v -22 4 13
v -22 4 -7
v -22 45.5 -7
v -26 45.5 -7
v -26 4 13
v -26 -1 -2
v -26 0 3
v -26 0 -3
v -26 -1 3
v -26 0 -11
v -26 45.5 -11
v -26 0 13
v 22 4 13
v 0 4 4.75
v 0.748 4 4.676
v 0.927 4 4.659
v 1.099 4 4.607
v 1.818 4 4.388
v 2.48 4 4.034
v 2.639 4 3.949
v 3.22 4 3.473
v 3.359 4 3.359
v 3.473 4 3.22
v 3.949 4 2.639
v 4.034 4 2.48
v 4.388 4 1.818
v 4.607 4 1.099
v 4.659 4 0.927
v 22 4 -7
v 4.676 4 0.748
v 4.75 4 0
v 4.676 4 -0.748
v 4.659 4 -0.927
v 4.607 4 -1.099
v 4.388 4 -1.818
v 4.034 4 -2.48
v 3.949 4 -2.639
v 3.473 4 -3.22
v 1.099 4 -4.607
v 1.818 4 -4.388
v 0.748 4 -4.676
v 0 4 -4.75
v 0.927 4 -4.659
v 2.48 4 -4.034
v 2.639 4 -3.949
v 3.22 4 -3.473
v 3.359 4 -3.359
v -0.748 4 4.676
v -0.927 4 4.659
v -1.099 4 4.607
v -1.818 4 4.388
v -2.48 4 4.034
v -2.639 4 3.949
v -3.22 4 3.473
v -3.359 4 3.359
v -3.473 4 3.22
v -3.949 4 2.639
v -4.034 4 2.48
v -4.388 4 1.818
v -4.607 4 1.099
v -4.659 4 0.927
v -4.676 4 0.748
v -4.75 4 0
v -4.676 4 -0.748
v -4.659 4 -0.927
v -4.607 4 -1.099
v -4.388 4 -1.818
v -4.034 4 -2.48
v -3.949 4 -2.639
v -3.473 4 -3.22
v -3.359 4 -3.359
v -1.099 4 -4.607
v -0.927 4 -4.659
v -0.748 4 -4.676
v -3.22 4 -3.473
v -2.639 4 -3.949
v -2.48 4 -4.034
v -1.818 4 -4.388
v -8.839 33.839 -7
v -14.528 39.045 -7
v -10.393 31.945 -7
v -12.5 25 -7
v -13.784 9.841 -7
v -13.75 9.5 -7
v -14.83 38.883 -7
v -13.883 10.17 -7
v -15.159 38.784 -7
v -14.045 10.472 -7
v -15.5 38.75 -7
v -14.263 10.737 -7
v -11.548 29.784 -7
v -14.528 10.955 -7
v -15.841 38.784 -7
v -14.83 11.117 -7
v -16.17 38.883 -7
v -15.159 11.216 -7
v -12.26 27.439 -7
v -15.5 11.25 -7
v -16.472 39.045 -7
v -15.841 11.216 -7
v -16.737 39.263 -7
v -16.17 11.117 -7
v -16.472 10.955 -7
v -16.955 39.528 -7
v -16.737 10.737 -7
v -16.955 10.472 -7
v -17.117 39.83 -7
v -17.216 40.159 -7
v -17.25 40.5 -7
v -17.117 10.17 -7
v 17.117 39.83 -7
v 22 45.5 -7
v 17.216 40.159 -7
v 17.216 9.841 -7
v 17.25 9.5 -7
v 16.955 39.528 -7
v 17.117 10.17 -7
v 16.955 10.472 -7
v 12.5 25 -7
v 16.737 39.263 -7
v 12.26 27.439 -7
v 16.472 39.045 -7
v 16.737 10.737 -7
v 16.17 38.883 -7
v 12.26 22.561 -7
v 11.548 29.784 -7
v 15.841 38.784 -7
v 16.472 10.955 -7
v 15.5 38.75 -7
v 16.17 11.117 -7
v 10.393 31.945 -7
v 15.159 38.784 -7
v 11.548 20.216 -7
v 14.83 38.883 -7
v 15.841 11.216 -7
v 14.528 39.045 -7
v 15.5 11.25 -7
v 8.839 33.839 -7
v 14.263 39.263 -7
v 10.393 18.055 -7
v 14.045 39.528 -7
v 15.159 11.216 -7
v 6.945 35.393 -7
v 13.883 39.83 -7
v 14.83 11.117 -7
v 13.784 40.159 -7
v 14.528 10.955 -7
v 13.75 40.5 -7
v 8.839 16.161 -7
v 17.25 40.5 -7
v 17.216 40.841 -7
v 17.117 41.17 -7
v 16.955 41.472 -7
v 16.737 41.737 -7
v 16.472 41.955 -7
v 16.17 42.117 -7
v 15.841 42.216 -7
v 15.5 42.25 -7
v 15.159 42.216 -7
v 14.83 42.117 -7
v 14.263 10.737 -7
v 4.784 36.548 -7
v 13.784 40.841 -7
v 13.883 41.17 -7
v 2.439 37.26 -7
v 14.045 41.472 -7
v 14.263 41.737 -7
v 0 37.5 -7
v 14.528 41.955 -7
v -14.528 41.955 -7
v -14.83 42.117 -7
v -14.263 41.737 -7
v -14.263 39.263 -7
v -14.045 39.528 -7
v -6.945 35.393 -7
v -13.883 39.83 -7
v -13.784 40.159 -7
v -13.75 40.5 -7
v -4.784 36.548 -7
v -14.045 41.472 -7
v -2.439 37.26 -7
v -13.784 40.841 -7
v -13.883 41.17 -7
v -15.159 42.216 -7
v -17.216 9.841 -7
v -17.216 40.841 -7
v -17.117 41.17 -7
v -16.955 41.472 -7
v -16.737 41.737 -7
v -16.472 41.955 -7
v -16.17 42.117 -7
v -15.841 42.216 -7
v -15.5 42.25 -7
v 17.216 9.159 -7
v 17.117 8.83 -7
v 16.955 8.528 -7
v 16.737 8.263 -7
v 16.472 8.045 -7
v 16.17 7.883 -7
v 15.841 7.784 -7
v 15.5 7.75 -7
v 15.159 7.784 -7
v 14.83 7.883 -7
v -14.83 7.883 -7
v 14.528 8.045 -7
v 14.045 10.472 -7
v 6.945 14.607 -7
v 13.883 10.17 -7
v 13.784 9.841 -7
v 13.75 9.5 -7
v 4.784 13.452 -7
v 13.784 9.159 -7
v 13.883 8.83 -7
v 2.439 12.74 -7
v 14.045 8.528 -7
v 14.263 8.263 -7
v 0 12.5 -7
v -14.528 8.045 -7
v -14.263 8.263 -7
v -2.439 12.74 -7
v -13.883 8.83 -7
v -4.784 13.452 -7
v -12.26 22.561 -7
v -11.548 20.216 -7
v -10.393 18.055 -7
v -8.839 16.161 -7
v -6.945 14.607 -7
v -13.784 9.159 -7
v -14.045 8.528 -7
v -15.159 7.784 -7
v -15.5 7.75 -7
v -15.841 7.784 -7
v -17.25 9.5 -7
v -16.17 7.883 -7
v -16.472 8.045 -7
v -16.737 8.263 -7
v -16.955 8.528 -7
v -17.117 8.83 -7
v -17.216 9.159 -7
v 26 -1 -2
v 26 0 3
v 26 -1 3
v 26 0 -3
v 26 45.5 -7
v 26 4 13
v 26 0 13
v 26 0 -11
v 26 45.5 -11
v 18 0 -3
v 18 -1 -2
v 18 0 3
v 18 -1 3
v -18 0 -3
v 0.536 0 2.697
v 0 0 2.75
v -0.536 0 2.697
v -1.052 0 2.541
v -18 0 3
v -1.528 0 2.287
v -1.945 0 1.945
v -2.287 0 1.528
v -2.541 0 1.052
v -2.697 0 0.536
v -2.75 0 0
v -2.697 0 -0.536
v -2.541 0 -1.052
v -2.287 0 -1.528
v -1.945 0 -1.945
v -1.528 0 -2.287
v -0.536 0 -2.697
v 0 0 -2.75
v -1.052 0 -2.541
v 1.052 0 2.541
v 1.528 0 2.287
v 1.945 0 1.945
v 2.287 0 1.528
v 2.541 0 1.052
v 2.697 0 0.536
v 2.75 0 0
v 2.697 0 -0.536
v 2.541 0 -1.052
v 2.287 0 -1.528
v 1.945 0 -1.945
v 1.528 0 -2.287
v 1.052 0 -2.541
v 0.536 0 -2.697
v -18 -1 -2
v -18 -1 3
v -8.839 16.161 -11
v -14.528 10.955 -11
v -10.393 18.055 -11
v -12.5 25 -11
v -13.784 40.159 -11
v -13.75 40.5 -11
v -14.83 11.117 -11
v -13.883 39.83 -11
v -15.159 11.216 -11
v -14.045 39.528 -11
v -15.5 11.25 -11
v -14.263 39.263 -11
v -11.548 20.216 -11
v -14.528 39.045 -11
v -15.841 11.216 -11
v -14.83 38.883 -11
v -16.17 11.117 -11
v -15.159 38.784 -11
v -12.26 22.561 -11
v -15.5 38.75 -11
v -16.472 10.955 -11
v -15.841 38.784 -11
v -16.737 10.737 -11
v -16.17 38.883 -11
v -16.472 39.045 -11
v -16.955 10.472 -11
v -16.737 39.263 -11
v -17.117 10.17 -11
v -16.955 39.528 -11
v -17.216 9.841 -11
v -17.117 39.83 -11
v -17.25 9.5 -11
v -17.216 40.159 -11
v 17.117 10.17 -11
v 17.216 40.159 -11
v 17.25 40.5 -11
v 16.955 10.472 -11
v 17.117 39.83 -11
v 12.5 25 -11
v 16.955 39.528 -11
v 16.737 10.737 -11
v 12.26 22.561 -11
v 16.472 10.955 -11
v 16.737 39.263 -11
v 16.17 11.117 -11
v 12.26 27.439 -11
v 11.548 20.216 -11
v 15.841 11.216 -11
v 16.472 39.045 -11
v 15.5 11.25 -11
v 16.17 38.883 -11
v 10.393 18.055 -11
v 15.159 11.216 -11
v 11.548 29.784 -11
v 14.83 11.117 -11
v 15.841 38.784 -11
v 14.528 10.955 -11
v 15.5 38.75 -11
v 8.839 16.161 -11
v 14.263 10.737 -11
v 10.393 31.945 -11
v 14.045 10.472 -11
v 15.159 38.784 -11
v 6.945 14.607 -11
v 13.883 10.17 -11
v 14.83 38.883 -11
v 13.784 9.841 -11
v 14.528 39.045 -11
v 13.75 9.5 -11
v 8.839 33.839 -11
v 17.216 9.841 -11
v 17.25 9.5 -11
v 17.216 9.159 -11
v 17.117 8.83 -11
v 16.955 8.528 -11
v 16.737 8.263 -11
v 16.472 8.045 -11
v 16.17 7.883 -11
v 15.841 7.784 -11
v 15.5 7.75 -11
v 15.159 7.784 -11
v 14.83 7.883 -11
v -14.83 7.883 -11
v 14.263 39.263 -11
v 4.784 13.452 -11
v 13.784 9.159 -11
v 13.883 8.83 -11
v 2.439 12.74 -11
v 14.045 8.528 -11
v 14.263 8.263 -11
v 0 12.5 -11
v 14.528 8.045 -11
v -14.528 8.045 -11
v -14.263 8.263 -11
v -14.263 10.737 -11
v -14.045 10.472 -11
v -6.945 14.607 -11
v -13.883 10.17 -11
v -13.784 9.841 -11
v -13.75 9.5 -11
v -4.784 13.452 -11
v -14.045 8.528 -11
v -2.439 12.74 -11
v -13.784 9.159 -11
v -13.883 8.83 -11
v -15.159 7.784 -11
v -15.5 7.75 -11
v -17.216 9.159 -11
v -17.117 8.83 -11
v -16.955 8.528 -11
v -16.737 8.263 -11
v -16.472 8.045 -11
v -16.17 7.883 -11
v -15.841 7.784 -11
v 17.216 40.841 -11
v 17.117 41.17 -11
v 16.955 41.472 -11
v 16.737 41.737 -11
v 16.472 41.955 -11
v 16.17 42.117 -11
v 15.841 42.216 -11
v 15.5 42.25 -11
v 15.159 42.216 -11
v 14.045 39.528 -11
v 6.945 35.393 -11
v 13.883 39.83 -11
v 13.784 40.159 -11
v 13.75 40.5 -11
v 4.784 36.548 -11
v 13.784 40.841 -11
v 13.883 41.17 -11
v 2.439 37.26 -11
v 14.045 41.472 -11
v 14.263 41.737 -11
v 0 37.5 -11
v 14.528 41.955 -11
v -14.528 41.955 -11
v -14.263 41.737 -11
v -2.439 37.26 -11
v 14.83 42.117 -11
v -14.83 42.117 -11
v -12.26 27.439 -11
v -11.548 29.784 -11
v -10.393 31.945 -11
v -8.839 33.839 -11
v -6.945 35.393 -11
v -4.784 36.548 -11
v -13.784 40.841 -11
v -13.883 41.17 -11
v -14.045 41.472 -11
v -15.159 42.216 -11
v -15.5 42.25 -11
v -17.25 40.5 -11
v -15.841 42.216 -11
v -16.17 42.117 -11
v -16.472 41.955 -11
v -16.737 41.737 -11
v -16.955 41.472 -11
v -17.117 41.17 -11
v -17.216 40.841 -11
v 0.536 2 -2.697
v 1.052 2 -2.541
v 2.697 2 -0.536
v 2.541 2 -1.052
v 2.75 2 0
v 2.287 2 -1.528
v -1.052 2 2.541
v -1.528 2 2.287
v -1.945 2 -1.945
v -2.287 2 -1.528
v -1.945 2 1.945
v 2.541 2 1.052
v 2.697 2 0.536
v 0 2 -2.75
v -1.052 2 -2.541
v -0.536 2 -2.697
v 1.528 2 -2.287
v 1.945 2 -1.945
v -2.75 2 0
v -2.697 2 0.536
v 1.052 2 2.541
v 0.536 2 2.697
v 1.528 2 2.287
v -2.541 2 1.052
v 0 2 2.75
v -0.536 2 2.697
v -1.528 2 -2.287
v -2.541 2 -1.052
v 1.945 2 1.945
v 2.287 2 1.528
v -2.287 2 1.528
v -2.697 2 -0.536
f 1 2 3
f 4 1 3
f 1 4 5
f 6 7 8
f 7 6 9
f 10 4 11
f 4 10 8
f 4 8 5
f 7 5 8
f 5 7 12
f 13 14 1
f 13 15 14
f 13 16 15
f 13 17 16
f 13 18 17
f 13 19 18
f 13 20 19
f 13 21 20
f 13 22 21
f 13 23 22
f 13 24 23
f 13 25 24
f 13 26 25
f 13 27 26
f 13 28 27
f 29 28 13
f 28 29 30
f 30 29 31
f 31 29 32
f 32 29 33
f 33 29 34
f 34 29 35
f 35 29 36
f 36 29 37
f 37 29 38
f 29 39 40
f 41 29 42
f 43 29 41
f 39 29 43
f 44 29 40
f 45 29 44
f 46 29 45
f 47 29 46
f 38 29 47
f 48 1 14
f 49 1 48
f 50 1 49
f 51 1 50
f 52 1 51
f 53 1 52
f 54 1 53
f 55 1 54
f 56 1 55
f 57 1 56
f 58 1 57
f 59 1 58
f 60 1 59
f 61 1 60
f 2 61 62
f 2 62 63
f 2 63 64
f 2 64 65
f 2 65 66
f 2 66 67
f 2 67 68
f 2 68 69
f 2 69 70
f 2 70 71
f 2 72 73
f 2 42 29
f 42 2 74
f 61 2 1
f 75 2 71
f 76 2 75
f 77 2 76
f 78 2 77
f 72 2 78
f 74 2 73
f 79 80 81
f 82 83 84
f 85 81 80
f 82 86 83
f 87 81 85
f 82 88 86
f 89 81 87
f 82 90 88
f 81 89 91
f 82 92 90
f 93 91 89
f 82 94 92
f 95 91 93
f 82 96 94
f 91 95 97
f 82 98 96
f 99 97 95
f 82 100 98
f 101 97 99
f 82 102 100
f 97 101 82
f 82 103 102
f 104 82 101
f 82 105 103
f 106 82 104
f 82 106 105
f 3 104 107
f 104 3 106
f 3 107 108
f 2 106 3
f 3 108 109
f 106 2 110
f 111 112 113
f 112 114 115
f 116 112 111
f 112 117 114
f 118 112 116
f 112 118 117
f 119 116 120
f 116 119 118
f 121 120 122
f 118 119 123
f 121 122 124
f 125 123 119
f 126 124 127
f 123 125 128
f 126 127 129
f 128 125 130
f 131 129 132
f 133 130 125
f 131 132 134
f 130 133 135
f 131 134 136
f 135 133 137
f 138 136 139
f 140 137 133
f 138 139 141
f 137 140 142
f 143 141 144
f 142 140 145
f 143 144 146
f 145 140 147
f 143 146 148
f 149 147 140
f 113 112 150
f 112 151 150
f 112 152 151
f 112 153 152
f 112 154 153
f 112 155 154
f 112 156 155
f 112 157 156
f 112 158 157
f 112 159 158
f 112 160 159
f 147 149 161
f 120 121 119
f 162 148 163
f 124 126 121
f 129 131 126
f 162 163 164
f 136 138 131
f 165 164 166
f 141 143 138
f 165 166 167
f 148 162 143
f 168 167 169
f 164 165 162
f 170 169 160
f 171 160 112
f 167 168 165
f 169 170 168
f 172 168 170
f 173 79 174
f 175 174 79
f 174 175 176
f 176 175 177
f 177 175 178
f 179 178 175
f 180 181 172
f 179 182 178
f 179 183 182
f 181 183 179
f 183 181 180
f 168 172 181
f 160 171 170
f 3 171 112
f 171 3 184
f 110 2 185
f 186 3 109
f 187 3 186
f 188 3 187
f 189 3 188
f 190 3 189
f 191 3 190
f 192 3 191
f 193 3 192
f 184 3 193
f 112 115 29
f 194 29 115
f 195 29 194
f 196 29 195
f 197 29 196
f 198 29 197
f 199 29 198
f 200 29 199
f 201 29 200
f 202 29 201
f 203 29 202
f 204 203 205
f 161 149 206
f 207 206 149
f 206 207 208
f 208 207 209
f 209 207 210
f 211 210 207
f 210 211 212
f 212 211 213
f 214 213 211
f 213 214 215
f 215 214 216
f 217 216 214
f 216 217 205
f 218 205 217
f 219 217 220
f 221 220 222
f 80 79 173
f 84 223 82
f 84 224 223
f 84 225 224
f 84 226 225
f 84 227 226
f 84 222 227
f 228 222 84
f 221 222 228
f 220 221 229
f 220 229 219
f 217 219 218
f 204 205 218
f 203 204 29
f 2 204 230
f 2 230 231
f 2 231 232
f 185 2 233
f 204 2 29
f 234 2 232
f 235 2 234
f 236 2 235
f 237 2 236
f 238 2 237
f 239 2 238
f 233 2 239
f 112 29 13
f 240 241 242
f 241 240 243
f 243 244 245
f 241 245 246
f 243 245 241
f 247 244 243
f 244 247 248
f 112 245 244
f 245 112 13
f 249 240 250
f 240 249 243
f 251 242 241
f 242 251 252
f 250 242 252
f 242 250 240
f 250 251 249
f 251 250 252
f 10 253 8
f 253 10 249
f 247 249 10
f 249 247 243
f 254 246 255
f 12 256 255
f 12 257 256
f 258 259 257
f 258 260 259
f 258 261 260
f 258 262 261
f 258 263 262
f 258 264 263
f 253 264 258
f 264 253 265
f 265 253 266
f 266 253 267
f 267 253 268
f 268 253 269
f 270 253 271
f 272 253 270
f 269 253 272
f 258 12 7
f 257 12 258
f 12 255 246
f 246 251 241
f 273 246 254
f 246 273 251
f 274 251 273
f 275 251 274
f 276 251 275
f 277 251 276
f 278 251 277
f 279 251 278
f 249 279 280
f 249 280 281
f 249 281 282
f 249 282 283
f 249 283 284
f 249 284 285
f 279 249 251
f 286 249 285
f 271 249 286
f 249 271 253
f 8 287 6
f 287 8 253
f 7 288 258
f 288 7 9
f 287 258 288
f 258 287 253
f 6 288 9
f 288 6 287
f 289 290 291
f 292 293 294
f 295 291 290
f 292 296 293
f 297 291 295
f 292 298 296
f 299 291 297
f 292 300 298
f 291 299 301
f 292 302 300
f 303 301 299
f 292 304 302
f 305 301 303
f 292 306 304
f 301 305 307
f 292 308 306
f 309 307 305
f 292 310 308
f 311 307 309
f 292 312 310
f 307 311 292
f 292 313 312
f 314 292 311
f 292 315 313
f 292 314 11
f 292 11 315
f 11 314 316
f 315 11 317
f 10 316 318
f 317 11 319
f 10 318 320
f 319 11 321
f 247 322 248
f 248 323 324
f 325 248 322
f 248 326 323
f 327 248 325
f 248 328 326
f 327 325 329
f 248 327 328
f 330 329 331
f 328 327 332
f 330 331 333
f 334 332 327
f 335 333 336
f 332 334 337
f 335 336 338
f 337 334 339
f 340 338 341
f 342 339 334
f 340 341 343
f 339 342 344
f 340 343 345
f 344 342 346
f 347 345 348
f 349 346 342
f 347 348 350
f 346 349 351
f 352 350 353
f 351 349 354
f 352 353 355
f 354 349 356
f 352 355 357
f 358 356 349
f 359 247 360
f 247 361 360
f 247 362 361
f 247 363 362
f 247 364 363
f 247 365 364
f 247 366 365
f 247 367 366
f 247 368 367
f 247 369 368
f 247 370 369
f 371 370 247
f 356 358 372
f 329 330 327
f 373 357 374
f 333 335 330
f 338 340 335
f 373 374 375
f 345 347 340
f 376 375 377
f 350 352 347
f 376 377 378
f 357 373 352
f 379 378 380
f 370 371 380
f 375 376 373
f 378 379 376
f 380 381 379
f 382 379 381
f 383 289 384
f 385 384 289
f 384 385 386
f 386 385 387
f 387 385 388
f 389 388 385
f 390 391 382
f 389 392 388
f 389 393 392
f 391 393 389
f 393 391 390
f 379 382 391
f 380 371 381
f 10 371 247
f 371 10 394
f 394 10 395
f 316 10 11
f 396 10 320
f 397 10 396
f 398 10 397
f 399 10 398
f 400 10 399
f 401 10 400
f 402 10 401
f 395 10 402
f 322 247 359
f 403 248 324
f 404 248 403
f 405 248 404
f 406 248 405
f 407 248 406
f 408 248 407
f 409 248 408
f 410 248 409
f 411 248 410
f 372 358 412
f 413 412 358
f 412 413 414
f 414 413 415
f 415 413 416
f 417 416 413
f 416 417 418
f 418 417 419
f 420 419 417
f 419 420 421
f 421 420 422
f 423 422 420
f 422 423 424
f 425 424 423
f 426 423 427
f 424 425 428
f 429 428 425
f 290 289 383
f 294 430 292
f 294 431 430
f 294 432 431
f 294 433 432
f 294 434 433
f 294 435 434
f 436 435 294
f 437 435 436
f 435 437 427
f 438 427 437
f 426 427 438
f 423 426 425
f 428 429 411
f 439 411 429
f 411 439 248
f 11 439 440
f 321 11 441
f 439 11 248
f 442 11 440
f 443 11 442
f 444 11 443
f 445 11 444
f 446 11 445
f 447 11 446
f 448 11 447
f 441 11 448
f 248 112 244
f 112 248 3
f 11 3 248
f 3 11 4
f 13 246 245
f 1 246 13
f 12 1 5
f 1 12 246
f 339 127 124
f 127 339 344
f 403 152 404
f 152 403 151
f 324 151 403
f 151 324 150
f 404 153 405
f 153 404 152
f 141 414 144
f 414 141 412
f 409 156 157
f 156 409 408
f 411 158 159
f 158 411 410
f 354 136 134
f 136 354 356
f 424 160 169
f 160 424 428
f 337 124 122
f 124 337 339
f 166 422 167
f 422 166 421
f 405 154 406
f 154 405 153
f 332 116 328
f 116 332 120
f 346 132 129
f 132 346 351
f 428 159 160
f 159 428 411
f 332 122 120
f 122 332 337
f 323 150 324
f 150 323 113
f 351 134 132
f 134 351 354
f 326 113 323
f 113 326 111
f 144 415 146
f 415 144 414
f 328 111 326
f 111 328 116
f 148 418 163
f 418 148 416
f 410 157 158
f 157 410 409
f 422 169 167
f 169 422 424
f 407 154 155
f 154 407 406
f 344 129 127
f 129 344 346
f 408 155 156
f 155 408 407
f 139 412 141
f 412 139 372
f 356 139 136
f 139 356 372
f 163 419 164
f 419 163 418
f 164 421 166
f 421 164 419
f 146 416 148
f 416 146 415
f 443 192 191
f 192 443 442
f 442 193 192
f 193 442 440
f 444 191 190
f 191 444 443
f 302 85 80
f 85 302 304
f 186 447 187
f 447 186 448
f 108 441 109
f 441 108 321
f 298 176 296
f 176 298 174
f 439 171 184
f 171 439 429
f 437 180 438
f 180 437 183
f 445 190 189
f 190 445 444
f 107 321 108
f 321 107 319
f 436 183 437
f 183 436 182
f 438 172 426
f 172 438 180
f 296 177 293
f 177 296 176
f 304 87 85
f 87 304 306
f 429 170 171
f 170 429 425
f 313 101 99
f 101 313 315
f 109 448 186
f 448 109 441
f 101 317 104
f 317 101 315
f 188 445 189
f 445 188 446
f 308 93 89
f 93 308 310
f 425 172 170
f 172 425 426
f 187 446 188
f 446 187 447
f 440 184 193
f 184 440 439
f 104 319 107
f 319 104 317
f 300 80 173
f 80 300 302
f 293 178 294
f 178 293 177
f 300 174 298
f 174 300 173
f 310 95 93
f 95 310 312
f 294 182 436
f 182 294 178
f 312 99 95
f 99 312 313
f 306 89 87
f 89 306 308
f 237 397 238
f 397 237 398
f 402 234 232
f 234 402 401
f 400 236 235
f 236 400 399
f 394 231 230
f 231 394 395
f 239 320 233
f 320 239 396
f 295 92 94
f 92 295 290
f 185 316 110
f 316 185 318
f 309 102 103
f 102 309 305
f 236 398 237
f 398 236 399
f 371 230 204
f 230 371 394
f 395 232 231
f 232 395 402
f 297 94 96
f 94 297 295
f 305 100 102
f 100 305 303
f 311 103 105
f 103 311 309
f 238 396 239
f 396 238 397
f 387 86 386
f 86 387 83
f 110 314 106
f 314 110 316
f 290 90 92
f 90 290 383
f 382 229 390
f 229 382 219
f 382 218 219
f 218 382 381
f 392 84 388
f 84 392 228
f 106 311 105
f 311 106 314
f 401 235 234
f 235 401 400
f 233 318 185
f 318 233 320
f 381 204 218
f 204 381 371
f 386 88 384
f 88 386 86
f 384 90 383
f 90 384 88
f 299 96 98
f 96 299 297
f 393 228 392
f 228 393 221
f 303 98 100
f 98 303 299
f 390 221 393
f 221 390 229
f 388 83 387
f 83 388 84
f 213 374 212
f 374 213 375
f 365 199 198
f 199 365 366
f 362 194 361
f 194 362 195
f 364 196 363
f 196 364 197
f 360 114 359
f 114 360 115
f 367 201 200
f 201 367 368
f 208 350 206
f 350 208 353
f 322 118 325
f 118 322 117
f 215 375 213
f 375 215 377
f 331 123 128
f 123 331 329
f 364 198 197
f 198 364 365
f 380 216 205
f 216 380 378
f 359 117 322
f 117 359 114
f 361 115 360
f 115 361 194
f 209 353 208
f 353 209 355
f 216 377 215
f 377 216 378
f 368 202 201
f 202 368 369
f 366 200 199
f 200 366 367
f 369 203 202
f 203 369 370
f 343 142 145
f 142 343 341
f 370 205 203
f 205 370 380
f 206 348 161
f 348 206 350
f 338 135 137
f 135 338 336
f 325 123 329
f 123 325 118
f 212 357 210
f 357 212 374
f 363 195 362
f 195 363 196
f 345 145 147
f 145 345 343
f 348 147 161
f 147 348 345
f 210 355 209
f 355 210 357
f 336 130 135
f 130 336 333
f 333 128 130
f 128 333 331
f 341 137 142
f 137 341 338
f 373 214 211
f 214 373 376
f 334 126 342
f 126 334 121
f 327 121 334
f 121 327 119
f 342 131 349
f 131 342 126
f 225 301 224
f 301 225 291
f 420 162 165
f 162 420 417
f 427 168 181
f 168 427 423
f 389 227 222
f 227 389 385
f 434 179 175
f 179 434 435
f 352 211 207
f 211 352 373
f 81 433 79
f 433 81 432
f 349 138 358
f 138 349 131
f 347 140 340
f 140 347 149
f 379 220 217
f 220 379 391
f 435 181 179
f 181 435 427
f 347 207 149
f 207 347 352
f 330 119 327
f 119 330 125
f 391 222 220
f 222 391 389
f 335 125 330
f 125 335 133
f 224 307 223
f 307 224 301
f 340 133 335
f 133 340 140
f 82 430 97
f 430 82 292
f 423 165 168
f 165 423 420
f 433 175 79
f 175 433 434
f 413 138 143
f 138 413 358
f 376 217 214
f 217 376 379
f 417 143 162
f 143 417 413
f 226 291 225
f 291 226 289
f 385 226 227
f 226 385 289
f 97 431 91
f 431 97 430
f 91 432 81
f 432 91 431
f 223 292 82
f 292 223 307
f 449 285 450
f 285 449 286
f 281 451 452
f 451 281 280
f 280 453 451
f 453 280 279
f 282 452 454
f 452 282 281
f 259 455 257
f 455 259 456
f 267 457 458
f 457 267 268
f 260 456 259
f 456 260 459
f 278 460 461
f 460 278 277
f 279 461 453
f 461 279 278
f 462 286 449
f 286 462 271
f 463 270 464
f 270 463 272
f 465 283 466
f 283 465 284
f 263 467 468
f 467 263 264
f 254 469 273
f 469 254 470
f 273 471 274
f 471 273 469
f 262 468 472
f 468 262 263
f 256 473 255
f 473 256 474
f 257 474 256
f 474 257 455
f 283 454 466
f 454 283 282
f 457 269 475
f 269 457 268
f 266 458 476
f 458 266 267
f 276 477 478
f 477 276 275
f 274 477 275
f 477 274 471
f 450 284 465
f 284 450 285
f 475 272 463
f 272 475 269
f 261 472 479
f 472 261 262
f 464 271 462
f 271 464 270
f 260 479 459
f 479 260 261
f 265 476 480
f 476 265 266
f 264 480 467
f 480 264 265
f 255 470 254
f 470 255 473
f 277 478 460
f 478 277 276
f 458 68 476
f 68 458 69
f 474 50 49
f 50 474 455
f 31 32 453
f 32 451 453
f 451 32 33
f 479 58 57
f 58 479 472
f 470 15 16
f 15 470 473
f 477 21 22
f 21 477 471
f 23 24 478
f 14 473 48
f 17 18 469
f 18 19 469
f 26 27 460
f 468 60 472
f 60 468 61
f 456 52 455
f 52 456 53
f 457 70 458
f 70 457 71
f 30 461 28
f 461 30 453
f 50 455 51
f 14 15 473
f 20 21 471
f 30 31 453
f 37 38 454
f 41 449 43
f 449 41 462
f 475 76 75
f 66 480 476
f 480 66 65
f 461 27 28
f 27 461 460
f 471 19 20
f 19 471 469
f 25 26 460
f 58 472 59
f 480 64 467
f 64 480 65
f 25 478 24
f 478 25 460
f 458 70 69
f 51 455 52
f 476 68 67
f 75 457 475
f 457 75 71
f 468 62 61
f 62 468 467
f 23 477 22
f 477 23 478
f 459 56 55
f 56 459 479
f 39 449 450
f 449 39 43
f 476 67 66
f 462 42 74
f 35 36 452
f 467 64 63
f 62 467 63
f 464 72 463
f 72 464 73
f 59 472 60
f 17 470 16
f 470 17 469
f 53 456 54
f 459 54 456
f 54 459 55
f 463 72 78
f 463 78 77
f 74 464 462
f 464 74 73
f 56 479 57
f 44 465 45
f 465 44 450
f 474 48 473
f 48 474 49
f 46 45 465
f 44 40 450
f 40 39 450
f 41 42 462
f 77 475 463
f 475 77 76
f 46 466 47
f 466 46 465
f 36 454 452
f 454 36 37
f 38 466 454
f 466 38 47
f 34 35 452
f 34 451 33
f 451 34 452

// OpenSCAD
// file: modules.scad
// Fonctions personnalisées

//http://forum.openscad.org/Wish-mirror-copy-true-td10681.html
module copy_mirror(vec=[0,1,0])
{
    children();
    mirror(vec) children();
}

module ecrou(plat,h){
  cylinder(d=plat*2/sqrt(3), h=h, $fn=6);
}


module courroie(diam,longueur){
  color ("black")
  difference(){
    hull(){
      cylinder(d=diam+1, h=6, $fn=32);
      translate([longueur,0,0]) cylinder(d=diam+1, h=6, $fn=32);
    }
    translate([0,0,-1])
    hull(){
      cylinder(d=diam-1, h=8, $fn=32);
      translate([longueur,0,0]) cylinder(d=diam-1, h=8, $fn=32);
    }
  }
  
  
}
// file: config.scad
// Paramètres de la machine

decal=-30;            // décallage du chassis xz
hauteur=400;          // hauteur totale chassis
largeur=400;          // largeur totale chassis
longueur=470;         // longueur totale chassis
hauteur_base=90;      // hauteur de la base
entraxe_y=140;        // distance entre les tiges Ø8 axe Y
entraxe_x=45;         // distance entre les tiges Ø8 axe X

couleur=[1,0.6,0];


// Plats écrous
ec3=5.7;
ec4=7.2;
ec5=8.2;
ec6=10.2;

// Jeu sur plats pour les écrous glissants
jec=0.2;

// hauteur écrous
ec3h=2.4;
ec4h=3.2;
ec5h=4.7;
ec6h=5.2;

// Vis
vis3=3.5;
vis4=4.5;
vis5=5.5;
vis6=6.5;


// Paramètre des pièces et jeux

// écart plateau/courroie
// y_belt_holder
belt_h=13;      // écart entre la courroie et le plateau

// écart plateau/tiges lisses
// y_lm8uu
decal_plateau=12; // Décallage en Y

// décallage des tiges lisses Y
// support_tige8_y
decal_tiges=5;

// décallage moteur Y
// y_motor
decal_motory_z=11;
decal_motory_y=25;

// Equerres de fixation position fermée
eq_ec=10;      // écart entre profilés

// Fixations axe Z
pos_z=26;      // position des axes par rapport au profilé (>= 21)
hauteur_z=20;  // hauteur des fixations
entraxe_z=17;  // distance entre les tiges Ø8 et M5
// est ce que la tige de 8 dépasse du profilé de 30?
// si oui, on décale les fixations
decalx=max(-42/2+entraxe_z+8/2+2, 0);

// Roulements linéaires
lbd = 15; // diamètre ext
lbh = 24; // hauteur

// x_carriage
he_x=23;  // entraxe hotend x
he_y=23;  // entraxe hotend y
sen_x=20; // entraxe capteur x
sen_y=23; // entraxe capteur y

// sensor_holder
sen_ep=3;   // épaisseur
sen_d=12.5; // diamètre du capteur
sen_pos=0;  // décentrage en x du capteur
sen_z=7;    // position Z de la bague

// y_belt_idler
ybi_ep1=4;       // épaisseur de la partie fixe
ybi_ep2=4;       // épaisseur de la partie mobile
ybi_h=16;        // position de l'axe
ybi_ec=11;       // écart pour le passage du ou des roulement
ybi_vis=vis4;    // diamètre passage de vis (axe)
ybi_ecrou=ec4;   // plat écrou
ybi_ecrouh=ec4h; // hauteur écrou
ybi_long=60;     // longueur de la partie mobile entre axes
ybi_prof=15;     // largeur de la partie mobile


// nombre de dents des poulies
poulie=20;

// Pas des courroies
pas=2;

// diamètre des poulies
dpoulie=poulie*pas/3.1416;
// main file
// eLKa1
// y_motor
// GNU GPL v3
// lkiefer <blog.lkiefer.org> and contributors
// http://www.reprap.org/wiki/ELKa
// https://github.com/kimented/elka1

include <config.scad>;
use <modules.scad>

module y_motor(){
  largeur=44;
  ep=4;
  entraxe=31;
  
  decaly=decal_motory_y-ep;
  decalz=decal_motory_z-ep;
  profondeur=decaly+entraxe/2+5;
  $fn=32;
  echo ("y_motor");
  
  color(couleur)
  translate([0,ep,-decalz])
  difference(){
    union(){
      translate([-largeur/2-ep,-ep,-ep]) cube([largeur+2*ep,profondeur+ep,ep]);
      translate([-largeur/2-ep,-ep,0]) cube([largeur+2*ep,ep,decalz+13]);
      copy_mirror([1,0,0]) translate([-largeur/2,0,0]) rotate([0,-90,0]) linear_extrude(ep) polygon([[0,0],[decalz+13,0],[0,profondeur]]);
      copy_mirror([1,0,0]) translate([largeur/2+ep,-ep,decalz-6/2]) rotate([90,0,-90]) linear_extrude(8) polygon([[0,0],[0,6],[1,6],[1,1]]);
    }
    translate([0,decaly,-ep-1]) cylinder(d=25, h=ep+2);
    translate([0,decaly,-ep-1])
    for (i=[0:3]){
      rotate([0,0,90*i]) translate([entraxe/2,entraxe/2,0]) cylinder(d=vis3, h=ep+2);
    }
    translate([0,-ep-1,decalz]) rotate([-90,0,0]) cylinder(d=vis5, h=ep+2);
    translate([0,-2,decalz]) rotate([-90,0,0]) cylinder(d1=vis5, d2=vis5+6, h=3);
    
  }
}

y_motor();
